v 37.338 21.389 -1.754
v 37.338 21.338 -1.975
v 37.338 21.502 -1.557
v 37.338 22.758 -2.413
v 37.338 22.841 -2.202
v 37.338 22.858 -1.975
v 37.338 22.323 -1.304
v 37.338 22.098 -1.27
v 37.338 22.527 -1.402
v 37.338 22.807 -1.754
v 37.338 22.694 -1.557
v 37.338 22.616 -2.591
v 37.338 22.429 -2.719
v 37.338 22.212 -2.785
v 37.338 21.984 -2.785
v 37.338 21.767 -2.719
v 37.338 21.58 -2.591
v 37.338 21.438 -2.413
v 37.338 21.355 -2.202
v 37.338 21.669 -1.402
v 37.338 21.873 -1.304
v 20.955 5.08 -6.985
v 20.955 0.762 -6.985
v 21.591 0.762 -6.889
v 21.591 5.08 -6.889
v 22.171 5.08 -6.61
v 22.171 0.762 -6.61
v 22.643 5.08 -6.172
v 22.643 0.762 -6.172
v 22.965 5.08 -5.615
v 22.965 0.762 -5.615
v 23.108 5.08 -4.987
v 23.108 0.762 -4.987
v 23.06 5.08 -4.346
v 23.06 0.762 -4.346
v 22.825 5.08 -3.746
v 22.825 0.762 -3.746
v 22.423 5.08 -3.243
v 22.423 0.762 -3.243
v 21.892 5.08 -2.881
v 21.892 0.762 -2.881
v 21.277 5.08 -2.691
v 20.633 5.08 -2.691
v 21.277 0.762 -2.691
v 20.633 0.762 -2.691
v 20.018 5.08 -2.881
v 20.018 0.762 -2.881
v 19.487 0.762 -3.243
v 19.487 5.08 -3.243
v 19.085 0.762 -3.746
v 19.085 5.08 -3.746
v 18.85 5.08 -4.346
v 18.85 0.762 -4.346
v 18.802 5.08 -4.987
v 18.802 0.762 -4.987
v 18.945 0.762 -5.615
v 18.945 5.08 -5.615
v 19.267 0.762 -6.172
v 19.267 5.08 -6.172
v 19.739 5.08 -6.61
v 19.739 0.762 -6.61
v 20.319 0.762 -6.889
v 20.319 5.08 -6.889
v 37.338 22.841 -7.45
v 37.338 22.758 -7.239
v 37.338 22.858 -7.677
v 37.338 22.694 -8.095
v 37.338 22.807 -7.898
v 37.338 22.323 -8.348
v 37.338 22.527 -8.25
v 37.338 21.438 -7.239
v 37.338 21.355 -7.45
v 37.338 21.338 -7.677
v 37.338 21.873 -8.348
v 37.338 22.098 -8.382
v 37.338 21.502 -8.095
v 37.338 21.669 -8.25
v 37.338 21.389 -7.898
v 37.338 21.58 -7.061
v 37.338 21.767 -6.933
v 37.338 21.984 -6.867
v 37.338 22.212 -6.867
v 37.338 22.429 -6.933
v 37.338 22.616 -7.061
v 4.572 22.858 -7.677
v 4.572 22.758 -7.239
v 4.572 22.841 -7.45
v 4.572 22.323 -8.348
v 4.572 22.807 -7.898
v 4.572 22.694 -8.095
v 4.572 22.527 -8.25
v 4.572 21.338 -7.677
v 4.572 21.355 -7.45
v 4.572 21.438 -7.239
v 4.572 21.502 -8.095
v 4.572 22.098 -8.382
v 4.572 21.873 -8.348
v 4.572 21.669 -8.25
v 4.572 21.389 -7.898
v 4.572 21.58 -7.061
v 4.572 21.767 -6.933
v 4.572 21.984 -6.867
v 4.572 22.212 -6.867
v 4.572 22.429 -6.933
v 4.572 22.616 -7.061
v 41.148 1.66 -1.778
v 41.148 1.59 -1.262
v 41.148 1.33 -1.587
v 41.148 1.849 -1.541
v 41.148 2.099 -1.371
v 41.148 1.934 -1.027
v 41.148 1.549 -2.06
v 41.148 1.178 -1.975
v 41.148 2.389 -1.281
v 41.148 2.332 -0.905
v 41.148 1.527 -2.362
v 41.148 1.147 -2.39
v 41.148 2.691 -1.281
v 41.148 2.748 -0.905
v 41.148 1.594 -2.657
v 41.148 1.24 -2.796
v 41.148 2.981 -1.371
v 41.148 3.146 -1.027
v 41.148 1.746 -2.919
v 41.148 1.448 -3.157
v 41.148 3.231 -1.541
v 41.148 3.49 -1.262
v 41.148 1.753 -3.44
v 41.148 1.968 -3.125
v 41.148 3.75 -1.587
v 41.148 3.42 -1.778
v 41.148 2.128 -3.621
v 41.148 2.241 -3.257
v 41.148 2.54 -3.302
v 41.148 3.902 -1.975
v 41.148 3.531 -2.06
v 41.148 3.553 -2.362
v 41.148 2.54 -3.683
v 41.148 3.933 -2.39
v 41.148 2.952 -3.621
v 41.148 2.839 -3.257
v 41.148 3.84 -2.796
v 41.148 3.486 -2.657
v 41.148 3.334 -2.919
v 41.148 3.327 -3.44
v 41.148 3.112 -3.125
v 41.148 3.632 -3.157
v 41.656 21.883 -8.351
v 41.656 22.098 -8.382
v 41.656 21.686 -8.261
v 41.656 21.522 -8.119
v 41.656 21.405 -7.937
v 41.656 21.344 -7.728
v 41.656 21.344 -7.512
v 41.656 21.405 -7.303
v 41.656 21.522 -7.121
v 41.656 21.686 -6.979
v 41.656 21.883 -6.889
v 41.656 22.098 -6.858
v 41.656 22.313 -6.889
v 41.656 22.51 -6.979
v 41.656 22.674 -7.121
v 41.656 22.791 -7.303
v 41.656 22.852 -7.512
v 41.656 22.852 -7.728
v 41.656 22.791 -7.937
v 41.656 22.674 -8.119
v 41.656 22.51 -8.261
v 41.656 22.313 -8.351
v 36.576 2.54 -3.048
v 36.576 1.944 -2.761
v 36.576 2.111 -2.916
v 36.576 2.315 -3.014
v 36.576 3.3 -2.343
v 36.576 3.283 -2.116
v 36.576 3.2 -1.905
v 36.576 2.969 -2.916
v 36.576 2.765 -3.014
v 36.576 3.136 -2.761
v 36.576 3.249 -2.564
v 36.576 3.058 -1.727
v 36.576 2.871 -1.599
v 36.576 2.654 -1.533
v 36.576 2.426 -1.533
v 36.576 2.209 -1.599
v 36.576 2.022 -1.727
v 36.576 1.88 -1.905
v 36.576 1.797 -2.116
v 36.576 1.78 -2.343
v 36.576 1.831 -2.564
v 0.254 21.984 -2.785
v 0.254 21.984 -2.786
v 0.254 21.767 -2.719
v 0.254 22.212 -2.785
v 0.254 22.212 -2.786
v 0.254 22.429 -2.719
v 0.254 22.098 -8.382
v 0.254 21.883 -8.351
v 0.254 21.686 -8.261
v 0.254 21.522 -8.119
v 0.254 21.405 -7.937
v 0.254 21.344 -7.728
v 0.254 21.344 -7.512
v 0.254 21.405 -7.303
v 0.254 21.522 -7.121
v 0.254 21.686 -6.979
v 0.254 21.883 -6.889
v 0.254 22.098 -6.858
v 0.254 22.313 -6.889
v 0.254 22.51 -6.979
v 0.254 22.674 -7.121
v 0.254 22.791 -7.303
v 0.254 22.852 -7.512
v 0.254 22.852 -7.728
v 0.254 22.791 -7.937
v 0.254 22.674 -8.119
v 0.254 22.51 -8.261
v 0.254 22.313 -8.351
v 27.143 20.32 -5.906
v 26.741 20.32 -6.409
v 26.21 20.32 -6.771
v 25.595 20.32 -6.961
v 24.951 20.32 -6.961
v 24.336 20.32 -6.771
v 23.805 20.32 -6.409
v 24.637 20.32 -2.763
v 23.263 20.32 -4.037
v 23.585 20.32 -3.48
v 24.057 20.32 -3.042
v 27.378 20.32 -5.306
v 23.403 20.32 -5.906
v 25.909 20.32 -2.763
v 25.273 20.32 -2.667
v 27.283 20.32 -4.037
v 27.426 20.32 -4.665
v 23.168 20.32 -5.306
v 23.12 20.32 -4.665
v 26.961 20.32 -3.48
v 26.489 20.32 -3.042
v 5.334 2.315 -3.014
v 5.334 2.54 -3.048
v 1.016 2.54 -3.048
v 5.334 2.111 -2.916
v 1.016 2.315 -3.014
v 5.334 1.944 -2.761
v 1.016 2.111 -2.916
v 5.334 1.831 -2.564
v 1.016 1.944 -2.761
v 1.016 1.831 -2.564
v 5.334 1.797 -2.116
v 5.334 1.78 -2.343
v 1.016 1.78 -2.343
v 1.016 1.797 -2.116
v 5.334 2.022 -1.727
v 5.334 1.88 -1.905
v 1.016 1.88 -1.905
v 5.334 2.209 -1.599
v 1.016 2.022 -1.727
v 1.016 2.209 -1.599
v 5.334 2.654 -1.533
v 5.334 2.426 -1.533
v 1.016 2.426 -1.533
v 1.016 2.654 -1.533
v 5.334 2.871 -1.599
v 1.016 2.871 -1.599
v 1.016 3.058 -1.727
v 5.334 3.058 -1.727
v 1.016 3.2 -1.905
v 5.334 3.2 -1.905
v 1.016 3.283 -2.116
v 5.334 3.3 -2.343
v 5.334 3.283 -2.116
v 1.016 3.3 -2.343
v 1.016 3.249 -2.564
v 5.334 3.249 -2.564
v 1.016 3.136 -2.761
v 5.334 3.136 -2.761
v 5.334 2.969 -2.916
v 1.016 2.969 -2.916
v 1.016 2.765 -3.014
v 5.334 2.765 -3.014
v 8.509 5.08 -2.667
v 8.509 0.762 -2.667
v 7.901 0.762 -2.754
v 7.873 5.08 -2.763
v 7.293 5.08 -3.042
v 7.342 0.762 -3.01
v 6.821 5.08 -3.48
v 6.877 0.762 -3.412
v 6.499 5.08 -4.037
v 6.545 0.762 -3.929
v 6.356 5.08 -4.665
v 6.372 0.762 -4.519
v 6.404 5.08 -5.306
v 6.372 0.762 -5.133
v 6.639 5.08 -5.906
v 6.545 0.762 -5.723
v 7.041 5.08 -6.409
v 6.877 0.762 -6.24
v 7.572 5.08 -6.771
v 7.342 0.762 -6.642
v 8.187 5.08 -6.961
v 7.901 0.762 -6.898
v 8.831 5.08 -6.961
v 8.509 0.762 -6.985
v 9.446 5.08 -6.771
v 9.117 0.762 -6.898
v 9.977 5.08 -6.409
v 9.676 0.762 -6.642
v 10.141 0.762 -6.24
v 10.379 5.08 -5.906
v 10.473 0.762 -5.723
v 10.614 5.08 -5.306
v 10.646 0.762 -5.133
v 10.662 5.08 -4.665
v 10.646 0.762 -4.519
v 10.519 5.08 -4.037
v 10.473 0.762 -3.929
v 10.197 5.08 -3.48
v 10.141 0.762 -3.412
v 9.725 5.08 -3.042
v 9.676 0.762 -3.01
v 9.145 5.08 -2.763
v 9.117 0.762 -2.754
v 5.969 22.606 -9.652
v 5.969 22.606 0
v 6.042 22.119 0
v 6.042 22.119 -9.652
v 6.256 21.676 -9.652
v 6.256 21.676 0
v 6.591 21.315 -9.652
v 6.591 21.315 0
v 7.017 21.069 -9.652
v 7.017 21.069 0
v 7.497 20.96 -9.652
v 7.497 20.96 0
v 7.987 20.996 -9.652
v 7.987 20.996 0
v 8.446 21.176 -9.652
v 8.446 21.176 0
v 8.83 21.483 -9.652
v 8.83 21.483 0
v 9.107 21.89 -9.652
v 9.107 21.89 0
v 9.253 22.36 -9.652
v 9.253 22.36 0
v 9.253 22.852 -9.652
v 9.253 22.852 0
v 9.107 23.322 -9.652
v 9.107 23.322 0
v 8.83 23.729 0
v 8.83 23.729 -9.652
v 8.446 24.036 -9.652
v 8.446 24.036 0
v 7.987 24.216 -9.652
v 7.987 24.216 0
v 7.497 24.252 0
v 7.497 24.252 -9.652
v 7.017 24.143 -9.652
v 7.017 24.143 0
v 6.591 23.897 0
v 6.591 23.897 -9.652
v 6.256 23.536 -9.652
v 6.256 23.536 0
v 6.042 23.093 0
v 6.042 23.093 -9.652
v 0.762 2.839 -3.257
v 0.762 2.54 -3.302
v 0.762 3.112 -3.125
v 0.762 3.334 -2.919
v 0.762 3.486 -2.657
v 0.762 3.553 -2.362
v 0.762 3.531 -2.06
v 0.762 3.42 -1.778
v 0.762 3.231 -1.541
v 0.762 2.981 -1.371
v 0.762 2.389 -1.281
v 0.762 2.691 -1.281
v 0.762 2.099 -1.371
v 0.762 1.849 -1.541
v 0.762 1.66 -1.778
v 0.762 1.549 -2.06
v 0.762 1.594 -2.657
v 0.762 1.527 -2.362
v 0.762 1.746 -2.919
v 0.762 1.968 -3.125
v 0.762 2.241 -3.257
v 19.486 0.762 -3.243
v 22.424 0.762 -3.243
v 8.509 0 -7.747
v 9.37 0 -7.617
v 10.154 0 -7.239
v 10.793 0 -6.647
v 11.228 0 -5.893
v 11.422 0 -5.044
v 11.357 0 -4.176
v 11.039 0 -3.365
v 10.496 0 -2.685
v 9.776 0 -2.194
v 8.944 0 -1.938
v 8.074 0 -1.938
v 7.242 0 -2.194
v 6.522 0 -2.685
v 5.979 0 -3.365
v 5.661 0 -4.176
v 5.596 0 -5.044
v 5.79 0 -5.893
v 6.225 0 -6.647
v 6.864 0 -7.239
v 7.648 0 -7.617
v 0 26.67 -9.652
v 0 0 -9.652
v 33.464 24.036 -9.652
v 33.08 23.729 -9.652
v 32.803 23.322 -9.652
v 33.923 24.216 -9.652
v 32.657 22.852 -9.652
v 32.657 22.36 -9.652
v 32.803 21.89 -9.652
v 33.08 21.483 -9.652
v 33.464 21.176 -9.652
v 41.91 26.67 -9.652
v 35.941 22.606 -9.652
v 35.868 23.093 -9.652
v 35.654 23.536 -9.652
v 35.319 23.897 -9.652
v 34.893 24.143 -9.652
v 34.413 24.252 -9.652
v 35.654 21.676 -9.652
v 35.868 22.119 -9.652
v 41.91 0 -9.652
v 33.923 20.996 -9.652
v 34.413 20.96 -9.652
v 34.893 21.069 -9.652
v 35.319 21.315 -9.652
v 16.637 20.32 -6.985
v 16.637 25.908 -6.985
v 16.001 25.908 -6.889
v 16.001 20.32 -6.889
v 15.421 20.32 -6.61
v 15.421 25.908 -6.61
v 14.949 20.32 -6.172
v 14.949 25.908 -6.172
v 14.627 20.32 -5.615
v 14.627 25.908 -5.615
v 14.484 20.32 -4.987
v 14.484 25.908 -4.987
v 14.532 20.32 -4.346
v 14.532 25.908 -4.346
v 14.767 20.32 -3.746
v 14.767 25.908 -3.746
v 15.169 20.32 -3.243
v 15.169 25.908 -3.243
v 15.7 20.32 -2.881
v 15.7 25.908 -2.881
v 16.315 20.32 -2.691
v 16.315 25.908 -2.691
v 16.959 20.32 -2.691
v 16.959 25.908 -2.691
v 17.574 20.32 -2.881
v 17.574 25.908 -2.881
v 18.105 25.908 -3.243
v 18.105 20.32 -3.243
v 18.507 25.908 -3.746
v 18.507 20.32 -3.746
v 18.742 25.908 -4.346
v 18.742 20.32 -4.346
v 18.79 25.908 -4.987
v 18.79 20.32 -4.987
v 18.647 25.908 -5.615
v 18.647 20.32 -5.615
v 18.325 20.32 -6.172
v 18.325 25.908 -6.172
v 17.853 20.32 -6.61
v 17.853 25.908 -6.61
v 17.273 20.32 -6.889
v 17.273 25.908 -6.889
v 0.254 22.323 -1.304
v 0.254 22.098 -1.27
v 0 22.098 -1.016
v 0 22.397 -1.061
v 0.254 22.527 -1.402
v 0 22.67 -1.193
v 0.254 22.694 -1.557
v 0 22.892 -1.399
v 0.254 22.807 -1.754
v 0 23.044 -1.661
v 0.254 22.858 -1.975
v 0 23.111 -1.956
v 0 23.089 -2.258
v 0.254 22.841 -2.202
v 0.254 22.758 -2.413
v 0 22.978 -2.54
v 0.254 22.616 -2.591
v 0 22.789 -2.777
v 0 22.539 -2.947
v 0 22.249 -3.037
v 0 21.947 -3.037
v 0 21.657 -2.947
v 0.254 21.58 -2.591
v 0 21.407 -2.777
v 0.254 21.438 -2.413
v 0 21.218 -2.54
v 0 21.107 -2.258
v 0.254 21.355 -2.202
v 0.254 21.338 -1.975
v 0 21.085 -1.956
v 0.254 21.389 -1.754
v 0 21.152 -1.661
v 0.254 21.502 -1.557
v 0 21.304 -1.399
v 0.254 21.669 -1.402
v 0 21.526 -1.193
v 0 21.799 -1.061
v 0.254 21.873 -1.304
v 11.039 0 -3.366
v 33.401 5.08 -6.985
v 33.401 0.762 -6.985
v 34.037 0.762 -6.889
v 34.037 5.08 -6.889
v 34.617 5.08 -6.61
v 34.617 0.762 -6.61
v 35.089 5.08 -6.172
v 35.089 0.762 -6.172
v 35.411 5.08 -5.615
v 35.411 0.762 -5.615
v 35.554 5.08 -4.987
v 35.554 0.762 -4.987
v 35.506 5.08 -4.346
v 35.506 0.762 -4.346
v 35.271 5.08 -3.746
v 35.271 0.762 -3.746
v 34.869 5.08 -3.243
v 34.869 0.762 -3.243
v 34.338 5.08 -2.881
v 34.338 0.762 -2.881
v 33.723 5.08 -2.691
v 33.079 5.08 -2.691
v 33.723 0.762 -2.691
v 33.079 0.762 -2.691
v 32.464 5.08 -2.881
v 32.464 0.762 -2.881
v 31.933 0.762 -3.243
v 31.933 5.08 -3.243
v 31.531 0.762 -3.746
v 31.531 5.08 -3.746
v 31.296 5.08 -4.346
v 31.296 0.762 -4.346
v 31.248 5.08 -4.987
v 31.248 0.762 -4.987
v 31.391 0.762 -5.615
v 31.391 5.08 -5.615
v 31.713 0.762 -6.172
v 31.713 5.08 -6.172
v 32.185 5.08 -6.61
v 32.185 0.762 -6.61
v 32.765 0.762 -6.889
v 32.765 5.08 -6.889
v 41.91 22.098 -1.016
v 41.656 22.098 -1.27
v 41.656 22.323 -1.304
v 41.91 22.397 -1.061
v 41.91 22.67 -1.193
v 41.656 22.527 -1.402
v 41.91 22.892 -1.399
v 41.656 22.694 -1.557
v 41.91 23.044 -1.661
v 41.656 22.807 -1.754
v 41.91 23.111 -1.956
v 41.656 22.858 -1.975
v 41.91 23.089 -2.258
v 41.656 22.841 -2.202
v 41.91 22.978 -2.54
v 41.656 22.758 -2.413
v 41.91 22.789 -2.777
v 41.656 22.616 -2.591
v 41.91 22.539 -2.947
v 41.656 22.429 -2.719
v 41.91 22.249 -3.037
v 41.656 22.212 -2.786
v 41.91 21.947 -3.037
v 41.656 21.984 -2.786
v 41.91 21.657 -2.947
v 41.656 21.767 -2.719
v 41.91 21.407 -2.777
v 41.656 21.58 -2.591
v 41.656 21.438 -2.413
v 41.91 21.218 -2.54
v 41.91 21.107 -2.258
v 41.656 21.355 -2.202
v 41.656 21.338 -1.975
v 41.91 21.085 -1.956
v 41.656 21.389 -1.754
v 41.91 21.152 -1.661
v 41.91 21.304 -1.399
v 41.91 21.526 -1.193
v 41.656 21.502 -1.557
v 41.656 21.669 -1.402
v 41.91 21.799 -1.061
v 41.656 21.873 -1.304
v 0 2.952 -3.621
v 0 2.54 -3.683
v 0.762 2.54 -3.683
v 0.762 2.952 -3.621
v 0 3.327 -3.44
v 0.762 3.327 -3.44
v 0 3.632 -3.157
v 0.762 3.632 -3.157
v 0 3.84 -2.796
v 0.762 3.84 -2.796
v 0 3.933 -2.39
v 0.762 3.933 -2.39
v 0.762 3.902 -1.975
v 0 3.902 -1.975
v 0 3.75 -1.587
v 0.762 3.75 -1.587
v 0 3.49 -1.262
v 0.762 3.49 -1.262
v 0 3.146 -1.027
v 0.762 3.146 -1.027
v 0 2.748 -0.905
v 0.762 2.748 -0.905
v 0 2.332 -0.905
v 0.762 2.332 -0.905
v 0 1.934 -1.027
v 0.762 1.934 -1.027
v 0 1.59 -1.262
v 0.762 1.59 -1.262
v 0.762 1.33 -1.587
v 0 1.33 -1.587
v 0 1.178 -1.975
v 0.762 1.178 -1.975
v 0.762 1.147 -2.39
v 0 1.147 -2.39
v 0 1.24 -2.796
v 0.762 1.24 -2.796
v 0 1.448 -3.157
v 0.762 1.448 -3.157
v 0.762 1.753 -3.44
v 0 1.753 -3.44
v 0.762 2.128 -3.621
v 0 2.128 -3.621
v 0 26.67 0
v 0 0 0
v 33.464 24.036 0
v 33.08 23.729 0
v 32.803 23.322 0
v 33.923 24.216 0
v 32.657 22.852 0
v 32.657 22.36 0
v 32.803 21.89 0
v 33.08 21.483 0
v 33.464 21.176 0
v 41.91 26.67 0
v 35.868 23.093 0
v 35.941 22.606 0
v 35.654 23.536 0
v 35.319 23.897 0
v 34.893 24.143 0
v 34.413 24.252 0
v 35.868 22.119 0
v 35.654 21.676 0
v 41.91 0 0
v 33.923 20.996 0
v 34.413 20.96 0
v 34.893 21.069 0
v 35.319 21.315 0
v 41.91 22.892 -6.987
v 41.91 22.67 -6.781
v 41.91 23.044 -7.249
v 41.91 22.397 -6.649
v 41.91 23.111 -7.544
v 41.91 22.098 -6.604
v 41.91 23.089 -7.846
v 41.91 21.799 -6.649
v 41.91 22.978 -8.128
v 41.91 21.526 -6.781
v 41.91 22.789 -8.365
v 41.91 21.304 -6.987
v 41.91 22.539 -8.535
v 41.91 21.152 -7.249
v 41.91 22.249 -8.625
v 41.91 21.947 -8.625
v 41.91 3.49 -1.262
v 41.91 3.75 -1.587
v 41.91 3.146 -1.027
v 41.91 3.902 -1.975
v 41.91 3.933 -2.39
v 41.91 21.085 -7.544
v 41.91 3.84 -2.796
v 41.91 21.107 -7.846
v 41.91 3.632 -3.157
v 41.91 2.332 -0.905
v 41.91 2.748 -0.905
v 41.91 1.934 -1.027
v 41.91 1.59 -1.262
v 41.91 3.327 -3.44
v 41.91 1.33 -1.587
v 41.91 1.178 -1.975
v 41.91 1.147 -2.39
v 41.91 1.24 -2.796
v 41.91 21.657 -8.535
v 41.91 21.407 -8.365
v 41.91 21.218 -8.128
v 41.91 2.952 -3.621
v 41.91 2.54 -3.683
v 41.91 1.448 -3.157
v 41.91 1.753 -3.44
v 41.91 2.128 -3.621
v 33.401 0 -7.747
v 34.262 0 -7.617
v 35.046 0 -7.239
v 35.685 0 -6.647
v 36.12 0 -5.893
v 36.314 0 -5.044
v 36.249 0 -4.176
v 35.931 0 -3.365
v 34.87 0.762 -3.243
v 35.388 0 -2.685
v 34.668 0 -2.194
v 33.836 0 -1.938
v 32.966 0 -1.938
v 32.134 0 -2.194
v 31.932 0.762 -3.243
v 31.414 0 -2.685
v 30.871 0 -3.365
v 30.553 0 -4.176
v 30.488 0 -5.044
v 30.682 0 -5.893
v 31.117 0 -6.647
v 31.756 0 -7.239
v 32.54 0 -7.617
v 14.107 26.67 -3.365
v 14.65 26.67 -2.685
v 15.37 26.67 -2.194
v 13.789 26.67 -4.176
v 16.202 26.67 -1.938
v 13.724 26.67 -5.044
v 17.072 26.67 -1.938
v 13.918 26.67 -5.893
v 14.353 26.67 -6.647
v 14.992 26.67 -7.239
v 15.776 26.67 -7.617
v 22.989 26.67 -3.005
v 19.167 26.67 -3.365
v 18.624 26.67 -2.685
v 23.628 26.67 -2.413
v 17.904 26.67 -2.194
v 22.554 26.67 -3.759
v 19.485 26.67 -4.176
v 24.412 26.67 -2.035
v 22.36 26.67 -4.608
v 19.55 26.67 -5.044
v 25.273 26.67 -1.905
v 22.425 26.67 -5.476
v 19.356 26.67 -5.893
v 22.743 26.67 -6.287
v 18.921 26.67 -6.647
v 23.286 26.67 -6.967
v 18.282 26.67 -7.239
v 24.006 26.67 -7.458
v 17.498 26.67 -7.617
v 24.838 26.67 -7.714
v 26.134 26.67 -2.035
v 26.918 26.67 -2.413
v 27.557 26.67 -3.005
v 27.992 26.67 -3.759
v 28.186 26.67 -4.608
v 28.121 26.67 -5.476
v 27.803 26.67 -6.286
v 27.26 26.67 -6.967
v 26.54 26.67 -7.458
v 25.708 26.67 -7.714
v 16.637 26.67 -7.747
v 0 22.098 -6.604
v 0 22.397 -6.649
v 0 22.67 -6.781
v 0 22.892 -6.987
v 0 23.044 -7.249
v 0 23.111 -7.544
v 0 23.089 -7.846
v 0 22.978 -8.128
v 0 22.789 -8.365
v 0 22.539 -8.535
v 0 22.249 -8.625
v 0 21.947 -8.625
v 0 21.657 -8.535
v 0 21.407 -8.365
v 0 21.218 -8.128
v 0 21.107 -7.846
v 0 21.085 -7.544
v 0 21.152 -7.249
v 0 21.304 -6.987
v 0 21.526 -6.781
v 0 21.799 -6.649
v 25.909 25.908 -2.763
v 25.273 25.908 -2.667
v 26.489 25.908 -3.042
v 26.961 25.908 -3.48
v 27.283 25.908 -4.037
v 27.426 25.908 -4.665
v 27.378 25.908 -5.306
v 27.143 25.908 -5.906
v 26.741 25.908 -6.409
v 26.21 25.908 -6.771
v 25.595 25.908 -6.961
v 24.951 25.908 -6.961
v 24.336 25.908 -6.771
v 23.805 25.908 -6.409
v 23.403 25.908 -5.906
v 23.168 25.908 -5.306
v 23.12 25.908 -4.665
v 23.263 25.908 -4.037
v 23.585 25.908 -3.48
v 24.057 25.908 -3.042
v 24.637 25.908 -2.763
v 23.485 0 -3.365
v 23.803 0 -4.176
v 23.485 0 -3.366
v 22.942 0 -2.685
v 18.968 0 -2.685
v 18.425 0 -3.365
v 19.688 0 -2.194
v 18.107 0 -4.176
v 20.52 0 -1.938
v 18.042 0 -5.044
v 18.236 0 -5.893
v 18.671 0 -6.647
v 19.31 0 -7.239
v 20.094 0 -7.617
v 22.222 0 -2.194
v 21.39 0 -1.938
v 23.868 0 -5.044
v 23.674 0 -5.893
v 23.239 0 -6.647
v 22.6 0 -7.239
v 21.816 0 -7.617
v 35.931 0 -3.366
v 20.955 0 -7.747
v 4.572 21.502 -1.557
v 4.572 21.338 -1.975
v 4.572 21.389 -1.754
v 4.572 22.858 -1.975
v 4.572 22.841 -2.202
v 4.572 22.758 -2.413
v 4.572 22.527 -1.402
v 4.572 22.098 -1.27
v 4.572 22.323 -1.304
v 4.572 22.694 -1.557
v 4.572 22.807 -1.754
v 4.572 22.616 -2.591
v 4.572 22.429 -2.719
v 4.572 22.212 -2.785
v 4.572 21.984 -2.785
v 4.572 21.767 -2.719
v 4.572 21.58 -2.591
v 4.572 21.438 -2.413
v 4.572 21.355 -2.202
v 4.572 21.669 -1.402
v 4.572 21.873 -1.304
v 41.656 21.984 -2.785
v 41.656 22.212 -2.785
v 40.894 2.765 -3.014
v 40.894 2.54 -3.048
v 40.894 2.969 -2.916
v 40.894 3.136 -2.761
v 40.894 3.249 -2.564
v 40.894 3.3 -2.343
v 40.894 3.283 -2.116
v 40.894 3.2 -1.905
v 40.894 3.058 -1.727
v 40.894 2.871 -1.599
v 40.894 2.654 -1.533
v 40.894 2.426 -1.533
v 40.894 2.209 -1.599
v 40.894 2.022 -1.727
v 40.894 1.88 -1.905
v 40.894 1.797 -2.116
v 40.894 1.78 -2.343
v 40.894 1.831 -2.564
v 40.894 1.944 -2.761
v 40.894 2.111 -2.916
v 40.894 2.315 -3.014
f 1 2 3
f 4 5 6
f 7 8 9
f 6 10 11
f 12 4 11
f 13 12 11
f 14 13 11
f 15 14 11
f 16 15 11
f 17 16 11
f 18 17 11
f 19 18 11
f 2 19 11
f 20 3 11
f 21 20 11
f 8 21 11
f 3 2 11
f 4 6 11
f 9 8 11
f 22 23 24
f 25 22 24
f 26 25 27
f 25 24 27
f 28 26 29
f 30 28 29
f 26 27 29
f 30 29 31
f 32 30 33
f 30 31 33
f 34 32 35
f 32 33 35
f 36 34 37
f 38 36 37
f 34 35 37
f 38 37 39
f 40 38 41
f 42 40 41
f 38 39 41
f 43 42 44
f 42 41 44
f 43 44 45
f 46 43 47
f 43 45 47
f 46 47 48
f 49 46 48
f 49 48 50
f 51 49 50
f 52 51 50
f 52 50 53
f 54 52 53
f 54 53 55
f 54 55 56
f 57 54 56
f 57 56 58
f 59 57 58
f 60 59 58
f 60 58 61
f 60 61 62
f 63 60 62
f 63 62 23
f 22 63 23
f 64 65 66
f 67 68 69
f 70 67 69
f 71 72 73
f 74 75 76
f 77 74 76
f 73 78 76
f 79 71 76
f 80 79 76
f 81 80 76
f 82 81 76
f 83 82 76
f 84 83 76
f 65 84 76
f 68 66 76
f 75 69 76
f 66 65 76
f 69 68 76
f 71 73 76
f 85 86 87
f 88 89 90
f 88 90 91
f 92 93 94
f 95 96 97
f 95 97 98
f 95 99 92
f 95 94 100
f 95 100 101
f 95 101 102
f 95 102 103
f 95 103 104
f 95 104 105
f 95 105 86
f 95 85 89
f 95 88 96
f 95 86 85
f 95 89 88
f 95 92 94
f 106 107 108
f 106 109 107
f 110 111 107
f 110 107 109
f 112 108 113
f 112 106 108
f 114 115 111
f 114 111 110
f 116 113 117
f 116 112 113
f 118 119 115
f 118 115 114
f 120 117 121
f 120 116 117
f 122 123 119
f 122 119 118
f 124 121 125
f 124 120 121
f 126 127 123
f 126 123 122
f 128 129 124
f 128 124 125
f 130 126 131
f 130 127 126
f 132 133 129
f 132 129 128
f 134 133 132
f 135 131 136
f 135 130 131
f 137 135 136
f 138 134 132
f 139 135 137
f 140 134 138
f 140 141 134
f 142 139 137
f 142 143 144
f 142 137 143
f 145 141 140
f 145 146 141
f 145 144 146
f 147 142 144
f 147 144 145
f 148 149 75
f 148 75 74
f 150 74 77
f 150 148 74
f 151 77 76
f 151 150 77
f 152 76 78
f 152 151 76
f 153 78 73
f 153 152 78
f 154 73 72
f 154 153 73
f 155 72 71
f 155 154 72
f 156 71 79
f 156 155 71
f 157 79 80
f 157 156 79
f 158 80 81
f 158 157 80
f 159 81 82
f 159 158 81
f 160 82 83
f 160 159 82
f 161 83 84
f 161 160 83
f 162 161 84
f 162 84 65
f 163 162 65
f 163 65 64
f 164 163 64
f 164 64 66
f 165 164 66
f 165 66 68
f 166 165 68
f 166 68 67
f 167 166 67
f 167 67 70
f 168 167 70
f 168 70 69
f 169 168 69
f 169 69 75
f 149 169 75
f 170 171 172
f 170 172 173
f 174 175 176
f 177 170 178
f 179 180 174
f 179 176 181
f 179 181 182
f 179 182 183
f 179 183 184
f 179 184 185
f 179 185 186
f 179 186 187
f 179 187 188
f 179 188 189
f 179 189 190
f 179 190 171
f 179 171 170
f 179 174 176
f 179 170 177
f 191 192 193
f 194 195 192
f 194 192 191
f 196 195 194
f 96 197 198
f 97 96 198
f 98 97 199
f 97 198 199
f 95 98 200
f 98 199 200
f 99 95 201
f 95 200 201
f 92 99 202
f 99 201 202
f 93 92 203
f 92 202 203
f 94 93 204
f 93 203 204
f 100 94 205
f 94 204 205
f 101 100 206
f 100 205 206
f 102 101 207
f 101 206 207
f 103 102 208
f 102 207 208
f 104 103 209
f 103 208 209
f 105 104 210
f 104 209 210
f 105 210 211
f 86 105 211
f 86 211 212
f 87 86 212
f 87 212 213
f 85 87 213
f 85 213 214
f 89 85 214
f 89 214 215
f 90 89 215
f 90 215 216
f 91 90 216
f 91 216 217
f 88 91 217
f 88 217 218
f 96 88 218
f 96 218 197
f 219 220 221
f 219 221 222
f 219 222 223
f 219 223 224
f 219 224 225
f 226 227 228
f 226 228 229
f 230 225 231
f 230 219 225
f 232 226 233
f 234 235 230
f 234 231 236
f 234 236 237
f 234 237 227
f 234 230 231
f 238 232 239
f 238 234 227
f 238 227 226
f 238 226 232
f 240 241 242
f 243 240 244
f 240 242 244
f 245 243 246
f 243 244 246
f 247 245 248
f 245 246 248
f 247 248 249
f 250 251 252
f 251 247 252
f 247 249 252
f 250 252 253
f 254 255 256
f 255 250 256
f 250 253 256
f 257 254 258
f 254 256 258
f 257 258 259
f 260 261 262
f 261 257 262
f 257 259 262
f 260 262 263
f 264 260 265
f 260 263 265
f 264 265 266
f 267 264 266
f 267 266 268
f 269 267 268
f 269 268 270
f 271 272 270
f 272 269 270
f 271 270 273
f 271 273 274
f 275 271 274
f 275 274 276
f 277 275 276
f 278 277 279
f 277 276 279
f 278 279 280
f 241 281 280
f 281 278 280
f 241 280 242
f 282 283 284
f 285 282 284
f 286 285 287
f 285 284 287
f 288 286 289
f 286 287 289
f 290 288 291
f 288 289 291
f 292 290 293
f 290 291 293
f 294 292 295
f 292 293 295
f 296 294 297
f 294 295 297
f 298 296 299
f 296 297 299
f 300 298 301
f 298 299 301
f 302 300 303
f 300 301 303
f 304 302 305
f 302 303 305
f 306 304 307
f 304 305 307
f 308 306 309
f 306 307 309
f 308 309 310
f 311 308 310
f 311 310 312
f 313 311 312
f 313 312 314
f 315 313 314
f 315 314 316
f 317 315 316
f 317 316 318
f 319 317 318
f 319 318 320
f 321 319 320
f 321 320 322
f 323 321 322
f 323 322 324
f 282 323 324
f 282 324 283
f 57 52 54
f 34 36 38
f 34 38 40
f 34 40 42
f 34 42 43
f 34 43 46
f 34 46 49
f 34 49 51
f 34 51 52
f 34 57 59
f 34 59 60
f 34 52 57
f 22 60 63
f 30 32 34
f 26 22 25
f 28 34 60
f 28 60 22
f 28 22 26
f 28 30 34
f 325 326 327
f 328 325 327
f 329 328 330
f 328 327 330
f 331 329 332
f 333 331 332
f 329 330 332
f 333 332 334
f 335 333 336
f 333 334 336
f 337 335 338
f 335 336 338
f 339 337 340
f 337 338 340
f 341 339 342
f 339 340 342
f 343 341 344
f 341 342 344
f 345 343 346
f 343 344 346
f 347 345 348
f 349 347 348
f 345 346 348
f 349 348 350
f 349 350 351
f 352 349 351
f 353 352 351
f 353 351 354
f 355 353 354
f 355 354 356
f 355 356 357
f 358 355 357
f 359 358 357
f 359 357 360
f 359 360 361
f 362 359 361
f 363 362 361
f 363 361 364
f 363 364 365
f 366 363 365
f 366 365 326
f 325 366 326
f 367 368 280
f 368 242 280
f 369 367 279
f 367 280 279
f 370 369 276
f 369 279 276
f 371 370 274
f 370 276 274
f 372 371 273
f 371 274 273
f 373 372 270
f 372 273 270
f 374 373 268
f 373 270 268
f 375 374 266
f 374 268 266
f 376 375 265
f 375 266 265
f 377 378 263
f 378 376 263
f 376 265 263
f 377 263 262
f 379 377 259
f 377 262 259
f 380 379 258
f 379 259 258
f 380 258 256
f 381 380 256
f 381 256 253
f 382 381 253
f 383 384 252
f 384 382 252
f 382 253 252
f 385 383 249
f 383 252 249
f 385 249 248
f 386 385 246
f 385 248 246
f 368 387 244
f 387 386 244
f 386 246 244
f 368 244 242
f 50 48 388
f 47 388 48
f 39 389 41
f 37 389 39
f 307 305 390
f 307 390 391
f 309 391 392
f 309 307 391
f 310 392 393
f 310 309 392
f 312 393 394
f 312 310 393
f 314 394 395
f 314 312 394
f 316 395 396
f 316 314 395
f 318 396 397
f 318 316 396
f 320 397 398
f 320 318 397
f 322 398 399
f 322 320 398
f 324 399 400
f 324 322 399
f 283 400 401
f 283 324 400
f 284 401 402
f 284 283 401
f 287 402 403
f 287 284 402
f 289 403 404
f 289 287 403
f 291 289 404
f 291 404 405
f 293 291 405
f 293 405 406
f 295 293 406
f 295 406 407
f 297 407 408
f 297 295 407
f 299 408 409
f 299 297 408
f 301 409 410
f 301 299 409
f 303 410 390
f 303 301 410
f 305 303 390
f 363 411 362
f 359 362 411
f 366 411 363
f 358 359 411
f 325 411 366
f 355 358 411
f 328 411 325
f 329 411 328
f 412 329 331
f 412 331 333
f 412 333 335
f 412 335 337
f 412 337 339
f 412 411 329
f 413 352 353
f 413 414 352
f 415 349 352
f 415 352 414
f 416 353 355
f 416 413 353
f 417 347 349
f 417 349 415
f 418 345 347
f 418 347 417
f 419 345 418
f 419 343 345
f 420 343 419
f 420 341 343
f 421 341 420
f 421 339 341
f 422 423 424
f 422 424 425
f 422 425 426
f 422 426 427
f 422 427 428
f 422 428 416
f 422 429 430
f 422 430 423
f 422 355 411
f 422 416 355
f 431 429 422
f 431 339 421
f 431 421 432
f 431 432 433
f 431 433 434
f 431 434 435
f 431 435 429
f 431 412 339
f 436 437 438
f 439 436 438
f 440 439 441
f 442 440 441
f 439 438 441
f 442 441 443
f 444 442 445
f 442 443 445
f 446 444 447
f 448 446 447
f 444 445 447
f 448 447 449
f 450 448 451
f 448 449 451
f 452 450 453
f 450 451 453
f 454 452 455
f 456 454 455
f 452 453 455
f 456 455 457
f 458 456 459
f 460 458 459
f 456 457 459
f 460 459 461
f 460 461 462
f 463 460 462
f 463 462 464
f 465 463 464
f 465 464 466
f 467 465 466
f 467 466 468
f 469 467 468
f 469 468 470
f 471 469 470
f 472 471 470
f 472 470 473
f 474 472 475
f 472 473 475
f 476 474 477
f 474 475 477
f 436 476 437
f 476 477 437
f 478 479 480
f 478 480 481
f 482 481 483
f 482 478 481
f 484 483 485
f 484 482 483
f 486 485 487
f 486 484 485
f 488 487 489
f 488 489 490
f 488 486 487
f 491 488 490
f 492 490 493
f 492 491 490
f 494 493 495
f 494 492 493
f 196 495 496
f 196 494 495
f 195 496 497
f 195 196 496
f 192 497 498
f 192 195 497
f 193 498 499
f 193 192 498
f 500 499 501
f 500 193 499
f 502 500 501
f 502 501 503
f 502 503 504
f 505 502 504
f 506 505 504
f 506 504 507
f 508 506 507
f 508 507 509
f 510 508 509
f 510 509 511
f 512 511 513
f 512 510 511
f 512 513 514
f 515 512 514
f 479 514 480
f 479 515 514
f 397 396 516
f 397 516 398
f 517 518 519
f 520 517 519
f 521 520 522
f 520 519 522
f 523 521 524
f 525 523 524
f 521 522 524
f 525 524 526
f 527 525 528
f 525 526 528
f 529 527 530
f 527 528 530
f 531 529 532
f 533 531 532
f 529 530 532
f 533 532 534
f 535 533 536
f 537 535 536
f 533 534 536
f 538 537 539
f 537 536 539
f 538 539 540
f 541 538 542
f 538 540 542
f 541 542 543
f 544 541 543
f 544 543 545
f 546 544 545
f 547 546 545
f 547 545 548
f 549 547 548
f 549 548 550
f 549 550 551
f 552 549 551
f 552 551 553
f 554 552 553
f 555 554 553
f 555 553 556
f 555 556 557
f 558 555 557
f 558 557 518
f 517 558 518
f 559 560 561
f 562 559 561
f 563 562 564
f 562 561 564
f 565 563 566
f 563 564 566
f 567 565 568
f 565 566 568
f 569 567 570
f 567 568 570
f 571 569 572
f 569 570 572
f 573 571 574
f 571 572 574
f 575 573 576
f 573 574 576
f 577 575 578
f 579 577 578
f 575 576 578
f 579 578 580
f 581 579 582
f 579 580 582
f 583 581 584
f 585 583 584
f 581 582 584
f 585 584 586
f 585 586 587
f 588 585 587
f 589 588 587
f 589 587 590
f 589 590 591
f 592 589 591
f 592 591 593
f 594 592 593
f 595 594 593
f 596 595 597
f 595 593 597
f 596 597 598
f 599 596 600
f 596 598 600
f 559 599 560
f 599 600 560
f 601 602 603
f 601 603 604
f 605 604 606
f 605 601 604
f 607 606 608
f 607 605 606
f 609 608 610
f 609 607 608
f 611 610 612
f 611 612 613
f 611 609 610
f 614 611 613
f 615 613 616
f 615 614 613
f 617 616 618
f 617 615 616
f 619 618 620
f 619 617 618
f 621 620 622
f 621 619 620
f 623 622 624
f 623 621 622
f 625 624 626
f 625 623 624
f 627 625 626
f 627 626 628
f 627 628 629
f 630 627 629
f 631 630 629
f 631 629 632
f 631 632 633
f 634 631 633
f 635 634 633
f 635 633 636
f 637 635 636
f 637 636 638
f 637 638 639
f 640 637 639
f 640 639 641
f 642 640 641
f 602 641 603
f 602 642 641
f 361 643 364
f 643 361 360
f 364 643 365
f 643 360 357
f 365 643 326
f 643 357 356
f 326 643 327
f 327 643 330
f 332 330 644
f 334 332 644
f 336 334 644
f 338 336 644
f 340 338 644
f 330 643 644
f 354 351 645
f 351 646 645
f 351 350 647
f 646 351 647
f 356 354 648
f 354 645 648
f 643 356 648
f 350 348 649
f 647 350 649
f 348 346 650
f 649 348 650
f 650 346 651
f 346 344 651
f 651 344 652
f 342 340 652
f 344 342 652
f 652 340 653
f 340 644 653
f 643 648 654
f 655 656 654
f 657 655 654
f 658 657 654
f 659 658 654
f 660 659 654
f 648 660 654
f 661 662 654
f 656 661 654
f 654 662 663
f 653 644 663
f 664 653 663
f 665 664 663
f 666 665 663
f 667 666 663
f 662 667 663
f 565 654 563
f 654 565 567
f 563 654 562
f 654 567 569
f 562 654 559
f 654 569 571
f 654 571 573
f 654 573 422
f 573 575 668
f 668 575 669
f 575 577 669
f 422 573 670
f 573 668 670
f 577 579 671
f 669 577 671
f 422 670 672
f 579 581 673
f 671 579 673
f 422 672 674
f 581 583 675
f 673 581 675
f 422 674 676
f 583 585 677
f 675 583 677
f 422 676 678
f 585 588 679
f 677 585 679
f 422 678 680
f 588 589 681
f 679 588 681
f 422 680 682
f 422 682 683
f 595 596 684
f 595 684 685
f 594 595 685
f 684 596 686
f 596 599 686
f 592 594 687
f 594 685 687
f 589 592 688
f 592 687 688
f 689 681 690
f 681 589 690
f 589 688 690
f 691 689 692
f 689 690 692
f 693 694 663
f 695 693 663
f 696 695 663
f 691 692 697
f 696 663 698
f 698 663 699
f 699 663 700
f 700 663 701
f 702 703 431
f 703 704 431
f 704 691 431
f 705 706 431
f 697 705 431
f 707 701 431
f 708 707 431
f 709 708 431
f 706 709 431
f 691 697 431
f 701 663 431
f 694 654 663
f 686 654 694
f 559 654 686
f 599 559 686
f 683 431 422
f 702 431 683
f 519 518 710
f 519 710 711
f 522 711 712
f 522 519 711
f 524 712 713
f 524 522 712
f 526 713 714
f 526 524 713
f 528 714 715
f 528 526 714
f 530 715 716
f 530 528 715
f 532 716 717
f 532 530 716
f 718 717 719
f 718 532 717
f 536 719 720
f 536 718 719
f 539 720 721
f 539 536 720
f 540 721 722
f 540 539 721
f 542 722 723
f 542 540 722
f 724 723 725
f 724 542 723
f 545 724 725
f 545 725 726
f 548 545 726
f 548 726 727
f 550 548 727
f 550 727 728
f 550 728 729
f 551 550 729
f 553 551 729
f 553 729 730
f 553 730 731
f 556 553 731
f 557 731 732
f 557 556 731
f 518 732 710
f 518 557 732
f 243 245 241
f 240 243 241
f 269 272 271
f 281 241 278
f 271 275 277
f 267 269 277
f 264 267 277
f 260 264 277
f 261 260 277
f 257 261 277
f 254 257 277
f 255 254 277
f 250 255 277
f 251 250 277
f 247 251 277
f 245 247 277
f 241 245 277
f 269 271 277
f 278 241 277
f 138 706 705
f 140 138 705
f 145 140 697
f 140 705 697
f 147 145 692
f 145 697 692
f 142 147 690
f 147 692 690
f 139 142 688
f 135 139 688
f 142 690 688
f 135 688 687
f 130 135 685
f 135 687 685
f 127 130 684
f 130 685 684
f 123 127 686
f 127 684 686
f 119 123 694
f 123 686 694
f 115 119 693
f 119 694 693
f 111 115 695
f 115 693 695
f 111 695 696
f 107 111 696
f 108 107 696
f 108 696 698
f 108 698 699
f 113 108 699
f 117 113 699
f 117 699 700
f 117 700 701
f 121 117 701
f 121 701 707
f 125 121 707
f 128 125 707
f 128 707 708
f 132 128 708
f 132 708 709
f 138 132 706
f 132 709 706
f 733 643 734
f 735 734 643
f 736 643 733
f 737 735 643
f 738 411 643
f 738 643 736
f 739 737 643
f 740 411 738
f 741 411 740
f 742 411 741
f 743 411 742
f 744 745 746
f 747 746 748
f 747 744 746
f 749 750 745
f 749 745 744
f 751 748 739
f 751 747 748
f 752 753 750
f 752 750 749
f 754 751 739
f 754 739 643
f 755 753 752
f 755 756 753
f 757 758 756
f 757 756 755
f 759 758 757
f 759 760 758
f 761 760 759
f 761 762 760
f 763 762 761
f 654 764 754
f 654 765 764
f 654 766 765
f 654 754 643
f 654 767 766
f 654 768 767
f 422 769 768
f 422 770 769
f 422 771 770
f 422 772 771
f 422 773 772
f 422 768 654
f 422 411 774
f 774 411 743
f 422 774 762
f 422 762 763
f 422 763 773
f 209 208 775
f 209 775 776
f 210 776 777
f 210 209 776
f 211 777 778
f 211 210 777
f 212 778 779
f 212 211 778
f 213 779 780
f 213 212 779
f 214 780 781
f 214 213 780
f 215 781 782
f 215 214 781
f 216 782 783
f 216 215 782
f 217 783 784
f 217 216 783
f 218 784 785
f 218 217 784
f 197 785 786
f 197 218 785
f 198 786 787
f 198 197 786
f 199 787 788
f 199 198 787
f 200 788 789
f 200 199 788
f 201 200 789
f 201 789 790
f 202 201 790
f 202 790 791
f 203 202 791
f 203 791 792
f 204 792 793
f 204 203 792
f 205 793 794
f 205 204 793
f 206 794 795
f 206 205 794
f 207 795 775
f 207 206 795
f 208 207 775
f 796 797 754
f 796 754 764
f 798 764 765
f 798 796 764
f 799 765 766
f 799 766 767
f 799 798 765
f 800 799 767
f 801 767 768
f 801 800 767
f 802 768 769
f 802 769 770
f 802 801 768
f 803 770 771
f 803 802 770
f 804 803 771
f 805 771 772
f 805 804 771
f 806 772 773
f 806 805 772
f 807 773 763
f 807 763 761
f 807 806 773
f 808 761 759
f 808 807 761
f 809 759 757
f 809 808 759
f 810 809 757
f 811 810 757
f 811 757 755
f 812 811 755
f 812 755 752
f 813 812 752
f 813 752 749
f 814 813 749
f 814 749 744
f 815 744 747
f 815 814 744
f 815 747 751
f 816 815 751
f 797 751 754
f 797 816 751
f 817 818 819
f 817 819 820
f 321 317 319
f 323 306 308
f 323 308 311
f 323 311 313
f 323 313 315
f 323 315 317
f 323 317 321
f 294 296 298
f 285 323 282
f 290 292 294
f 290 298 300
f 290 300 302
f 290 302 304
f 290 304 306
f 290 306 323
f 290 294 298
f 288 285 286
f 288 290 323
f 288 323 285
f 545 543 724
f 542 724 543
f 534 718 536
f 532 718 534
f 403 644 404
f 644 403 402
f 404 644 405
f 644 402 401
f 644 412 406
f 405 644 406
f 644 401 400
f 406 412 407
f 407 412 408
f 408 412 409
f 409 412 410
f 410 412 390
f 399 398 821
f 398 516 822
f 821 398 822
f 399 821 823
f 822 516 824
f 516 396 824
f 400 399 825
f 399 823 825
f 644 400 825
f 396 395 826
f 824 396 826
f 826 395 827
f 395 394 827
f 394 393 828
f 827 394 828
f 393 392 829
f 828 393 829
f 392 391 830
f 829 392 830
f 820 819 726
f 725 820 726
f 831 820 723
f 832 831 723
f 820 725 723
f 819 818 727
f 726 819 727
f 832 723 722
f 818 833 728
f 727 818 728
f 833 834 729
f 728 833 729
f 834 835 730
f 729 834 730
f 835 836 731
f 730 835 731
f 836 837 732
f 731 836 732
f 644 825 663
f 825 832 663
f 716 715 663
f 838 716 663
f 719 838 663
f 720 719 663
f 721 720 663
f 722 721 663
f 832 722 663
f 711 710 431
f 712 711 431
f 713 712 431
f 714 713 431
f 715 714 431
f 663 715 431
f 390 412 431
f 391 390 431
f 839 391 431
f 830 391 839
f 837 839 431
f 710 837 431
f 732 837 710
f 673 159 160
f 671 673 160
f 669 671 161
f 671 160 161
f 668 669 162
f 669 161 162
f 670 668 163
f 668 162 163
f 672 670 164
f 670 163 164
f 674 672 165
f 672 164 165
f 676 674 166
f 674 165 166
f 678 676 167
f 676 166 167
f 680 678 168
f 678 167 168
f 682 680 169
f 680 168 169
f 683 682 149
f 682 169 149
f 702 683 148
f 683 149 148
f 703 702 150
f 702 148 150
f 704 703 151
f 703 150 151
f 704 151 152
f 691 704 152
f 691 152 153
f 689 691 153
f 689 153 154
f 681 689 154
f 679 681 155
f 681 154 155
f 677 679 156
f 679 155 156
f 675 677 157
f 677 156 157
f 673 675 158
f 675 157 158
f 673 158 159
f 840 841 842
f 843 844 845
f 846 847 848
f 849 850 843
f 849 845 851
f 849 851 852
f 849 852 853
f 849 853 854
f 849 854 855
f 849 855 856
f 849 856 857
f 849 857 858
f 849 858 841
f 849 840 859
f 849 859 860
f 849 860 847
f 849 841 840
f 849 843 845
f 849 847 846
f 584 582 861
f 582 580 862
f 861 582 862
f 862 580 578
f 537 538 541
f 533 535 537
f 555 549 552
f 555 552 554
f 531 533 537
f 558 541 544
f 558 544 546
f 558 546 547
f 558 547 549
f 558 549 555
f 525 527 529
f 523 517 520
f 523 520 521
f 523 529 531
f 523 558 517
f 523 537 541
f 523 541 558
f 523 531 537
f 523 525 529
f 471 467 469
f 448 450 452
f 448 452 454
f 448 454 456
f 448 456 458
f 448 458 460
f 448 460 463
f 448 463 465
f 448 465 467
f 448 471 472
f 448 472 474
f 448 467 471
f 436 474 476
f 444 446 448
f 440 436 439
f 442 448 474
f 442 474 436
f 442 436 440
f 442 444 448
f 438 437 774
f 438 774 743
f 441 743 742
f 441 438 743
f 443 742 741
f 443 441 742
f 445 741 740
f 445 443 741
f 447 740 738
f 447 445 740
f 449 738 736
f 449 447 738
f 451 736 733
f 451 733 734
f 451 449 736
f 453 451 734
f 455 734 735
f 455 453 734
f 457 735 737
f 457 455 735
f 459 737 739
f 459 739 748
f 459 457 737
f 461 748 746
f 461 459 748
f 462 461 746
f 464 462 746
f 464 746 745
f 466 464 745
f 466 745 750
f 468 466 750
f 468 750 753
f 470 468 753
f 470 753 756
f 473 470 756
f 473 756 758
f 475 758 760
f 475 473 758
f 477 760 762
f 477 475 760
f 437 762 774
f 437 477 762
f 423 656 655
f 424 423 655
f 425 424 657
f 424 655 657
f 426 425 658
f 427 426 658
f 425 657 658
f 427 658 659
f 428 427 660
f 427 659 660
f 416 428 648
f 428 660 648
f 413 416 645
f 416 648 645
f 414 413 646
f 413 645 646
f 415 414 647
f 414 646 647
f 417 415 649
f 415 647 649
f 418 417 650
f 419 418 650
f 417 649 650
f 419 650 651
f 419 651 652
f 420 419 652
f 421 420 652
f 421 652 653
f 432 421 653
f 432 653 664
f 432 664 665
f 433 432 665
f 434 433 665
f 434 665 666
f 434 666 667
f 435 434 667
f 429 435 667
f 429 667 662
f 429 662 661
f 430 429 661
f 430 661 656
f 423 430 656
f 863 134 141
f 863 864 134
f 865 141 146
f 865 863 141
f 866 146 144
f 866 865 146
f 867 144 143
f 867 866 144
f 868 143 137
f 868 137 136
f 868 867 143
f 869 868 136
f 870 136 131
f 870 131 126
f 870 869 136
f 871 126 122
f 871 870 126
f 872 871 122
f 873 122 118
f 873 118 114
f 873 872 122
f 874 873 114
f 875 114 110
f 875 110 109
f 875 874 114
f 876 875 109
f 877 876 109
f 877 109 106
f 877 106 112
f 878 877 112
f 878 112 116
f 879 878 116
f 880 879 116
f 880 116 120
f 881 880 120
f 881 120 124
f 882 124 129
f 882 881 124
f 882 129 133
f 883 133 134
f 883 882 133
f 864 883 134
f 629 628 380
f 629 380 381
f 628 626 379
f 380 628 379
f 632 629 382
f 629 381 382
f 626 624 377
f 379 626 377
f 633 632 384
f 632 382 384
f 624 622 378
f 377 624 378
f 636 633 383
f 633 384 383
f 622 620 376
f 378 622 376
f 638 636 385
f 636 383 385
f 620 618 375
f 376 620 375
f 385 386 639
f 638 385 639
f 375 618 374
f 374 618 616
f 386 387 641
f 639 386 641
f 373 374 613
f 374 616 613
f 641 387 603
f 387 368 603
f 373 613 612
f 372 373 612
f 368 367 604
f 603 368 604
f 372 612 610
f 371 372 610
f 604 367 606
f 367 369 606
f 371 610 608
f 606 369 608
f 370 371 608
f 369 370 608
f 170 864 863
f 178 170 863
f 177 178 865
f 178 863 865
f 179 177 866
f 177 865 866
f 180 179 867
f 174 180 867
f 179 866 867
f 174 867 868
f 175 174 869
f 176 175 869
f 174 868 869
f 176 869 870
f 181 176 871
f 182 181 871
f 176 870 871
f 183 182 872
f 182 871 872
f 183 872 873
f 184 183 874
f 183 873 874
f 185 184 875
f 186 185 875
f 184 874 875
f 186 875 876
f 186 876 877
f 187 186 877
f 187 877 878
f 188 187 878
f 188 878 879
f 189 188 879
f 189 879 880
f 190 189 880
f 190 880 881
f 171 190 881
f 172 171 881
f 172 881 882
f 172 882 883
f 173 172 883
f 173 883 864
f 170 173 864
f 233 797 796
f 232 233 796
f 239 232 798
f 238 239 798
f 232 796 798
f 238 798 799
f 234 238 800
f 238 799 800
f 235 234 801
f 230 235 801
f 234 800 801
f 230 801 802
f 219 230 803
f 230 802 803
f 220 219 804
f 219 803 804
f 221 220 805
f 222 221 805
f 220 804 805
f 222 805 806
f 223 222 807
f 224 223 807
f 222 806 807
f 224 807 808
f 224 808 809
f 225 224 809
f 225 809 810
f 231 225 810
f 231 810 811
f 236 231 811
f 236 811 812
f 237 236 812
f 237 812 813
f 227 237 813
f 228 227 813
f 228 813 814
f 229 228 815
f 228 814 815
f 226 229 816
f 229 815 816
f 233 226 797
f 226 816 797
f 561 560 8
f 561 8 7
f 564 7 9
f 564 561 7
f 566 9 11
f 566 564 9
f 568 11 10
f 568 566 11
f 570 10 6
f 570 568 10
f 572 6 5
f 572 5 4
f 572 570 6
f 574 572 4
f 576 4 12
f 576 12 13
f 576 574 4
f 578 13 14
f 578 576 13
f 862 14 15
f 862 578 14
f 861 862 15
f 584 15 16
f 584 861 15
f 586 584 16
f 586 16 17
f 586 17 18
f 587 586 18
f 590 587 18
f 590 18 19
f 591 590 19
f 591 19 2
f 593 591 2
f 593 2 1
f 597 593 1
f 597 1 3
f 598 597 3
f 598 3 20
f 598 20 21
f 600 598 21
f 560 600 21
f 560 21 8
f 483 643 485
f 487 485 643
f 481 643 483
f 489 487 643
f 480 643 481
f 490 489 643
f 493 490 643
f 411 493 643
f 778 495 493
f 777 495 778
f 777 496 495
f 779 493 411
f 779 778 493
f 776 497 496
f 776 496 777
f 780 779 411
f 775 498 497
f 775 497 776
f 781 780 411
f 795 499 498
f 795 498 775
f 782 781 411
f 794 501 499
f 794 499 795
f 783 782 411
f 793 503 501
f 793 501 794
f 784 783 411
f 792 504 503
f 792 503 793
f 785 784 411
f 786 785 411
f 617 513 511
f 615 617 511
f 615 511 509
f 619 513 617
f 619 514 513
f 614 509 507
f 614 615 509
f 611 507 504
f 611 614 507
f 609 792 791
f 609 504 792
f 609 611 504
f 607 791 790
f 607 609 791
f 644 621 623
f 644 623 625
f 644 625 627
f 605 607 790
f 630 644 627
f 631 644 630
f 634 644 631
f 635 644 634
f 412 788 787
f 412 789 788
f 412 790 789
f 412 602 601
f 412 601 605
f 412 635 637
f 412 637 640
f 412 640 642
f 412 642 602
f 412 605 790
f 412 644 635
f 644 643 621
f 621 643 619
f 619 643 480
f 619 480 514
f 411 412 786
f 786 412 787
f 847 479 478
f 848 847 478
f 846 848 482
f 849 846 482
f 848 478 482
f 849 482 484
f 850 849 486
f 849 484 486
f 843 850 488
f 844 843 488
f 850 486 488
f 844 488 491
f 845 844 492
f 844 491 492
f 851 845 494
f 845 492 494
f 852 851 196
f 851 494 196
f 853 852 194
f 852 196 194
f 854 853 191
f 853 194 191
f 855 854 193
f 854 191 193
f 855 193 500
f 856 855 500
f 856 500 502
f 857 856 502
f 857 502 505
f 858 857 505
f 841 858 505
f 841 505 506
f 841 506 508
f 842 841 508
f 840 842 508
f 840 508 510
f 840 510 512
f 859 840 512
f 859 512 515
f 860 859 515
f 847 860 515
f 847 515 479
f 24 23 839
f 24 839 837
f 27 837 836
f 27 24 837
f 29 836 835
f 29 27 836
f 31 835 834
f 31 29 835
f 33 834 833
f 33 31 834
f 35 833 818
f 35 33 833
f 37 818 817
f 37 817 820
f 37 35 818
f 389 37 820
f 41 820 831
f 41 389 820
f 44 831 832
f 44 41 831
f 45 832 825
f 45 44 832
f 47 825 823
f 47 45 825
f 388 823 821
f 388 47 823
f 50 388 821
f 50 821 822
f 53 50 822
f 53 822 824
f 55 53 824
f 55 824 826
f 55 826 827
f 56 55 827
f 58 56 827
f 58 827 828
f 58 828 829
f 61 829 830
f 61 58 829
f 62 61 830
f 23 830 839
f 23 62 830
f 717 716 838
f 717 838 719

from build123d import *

# Parameters (mm, degrees)
SKETCH1_W                = 41.91
SKETCH1_H                = 9.652
BOSS_EXTRUDE1_DEPTH      = 26.67
SKETCH2_R                = 1.651
CUT_EXTRUDE1_DEPTH       = 51.605316954
SKETCH3_R                = 2.159
CUT_EXTRUDE2_DEPTH       = 6.35
CHAMFER5_SIZE            = 0.762
SKETCH5_R                = 2.159
CUT_EXTRUDE4_DEPTH       = 5.08
SKETCH6_R                = 2.921
CUT_EXTRUDE5_DEPTH       = 0.762
CHAMFER2_SIZE            = 0.762
SKETCH7_R                = 0.762
CUT_EXTRUDE6_DEPTH       = 5.334
SKETCH9_R                = 1.016
CUT_EXTRUDE7_DEPTH       = 1.27
SKETCH10_R               = 1.397
CUT_EXTRUDE8_DEPTH       = 0.762
CHAMFER3_SIZE            = 0.508
CHAMFER3_OF_MIRROR2_SIZE = 0.508
SKETCH12_R               = 0.762
CUT_EXTRUDE9_DEPTH       = 4.572
SKETCH14_R               = 1.016
CUT_EXTRUDE10_DEPTH      = 0.254
CHAMFER4_SIZE            = 0.254
CHAMFER4_OF_MIRROR3_SIZE = 0.254


# Some blends are built 0.0001 mm under size
with BuildPart() as part:
    # Sketch1 → Boss-Extrude1 (new body)
    with BuildSketch(Plane(origin=(0, 0, 0), x_dir=(1, 0, 0), z_dir=(0, 1, 0))):
        with Locations((20.955, 4.826)):
            Rectangle(SKETCH1_W, SKETCH1_H)
    extrude(amount=BOSS_EXTRUDE1_DEPTH)

    # Sketch2 → Cut-Extrude1 (cut, through all)
    with BuildSketch(Plane.XY):
        with Locations((34.29, 22.606)):
            Circle(SKETCH2_R)
        with Locations(Location((7.62, 22.606, 0), (0, 0, 180))):
            Circle(SKETCH2_R)
    extrude(amount=-CUT_EXTRUDE1_DEPTH, mode=Mode.SUBTRACT)

    # Sketch3 → Cut-Extrude2 (cut)
    with BuildSketch(Plane(origin=(0, 26.67, 0), x_dir=(1, 0, 0), z_dir=(0, 1, 0))):
        with Locations(Location((25.273, 4.826, 0), (0, 0, 270))):
            Circle(SKETCH3_R)
        with Locations(Location((16.637, 4.826, 0), (0, 0, 90))):
            Circle(SKETCH3_R)
    extrude(amount=-CUT_EXTRUDE2_DEPTH, mode=Mode.SUBTRACT)

    # Chamfer5
    chamfer5_edges = [part.edges().sort_by_distance(p)[0] for p in [
        (25.273, 26.67, -6.985),
        (16.637, 26.67, -2.667),
    ]]
    chamfer(chamfer5_edges, length=CHAMFER5_SIZE)

    # Sketch5 → Cut-Extrude4 (cut)
    with BuildSketch(Plane(origin=(0, 0, 0), x_dir=(-1, 0, 0), z_dir=(0, -1, 0))):
        with Locations(Location((-33.401, 4.826, 0), (0, 0, 90))):
            Circle(SKETCH5_R)
        with Locations(Location((-8.509, 4.826, 0), (0, 0, 270))):
            Circle(SKETCH5_R)
        with Locations(Location((-20.955, 4.826, 0), (0, 0, 90))):
            Circle(SKETCH5_R)
    extrude(amount=-CUT_EXTRUDE4_DEPTH, mode=Mode.SUBTRACT)

    # Sketch6 → Cut-Extrude5 (cut)
    with BuildSketch(Plane(origin=(0, 0, 0), x_dir=(-1, 0, 0), z_dir=(0, -1, 0))):
        with Locations(Location((-33.401, 4.826, 0), (0, 0, 90))):
            Circle(SKETCH6_R)
        with Locations(Location((-20.955, 4.826, 0), (0, 0, 90))):
            Circle(SKETCH6_R)
        with Locations(Location((-8.509, 4.826, 0), (0, 0, 90))):
            Circle(SKETCH6_R)
    extrude(amount=-CUT_EXTRUDE5_DEPTH, mode=Mode.SUBTRACT)

    # Chamfer2
    chamfer2_edges = [part.edges().sort_by_distance(p)[0] for p in [
        (33.401, 0.762, -1.905),
        (20.955, 0.762, -1.905),
        (8.509, 0.762, -1.905),
    ]]
    chamfer(chamfer2_edges, length=CHAMFER2_SIZE - 0.0001)  # a hair under: the kernel refuses the full size

    # Sketch7 → Cut-Extrude6 (cut)
    with BuildSketch(Plane(origin=(41.91, 0, 0), x_dir=(0, 0, -1), z_dir=(1, 0, 0))):
        with Locations((2.286, 2.54)):
            Circle(SKETCH7_R)
    cut_extrude6 = extrude(amount=-CUT_EXTRUDE6_DEPTH, mode=Mode.SUBTRACT)

    # Sketch9 → Cut-Extrude7 (cut)
    with BuildSketch(Plane(origin=(41.91, 0, 0), x_dir=(0, 0, -1), z_dir=(1, 0, 0))):
        with Locations((2.286, 2.54)):
            Circle(SKETCH9_R)
    cut_extrude7 = extrude(amount=-CUT_EXTRUDE7_DEPTH, mode=Mode.SUBTRACT)

    # Sketch10 → Cut-Extrude8 (cut)
    with BuildSketch(Plane(origin=(41.91, 0, 0), x_dir=(0, 0, -1), z_dir=(1, 0, 0))):
        with Locations((2.286, 2.54)):
            Circle(SKETCH10_R)
    cut_extrude8 = extrude(amount=-CUT_EXTRUDE8_DEPTH, mode=Mode.SUBTRACT)

    # Chamfer3
    # the kernel refuses this chamfer: 0.508 mm, written as the material it adds along each edge
    with BuildSketch(Plane(origin=(40.64, 2.54, -2.286), x_dir=(0, 0, -1), z_dir=(0, -1, 0))) as chamfer3_piece_1_section:
        Polygon((1.016, CHAMFER3_SIZE), (1.016 - CHAMFER3_SIZE, 0), (1.016, 0), align=None)
    chamfer3_piece_1 = revolve(axis=Axis((40.64, 2.54, -2.286), (1, 0, 0)), mode=Mode.PRIVATE)
    chamfer3_piece_1 = split(chamfer3_piece_1, bisect_by=Plane(origin=(41.148, 2.54, -1.391029136), z_dir=(-1, 0, 0)), keep=Keep.TOP, mode=Mode.PRIVATE)
    chamfer3_piece_1 = chamfer3_piece_1 - Plane(origin=(41.015029136, 2.54, -2.286), x_dir=(0, 0, -1), z_dir=(1, 0, 0)) * Cylinder(0.762, 5, mode=Mode.PRIVATE)
    add(chamfer3_piece_1)

    # Mirror2: Cut-Extrude6, Cut-Extrude7, Cut-Extrude8 across plane
    add(cut_extrude6.mirror(Plane.ZY.offset(-20.955)), mode=Mode.SUBTRACT)
    add(cut_extrude7.mirror(Plane.ZY.offset(-20.955)), mode=Mode.SUBTRACT)
    add(cut_extrude8.mirror(Plane.ZY.offset(-20.955)), mode=Mode.SUBTRACT)

    # Chamfer3 of Mirror2
    # the kernel refuses this chamfer: 0.508 mm, written as the material it adds along each edge
    with BuildSketch(Plane(origin=(1.27, 2.54, -2.286), x_dir=(0, 0, -1), z_dir=(0, -1, 0))) as chamfer3_of_mirror2_piece_1_section:
        Polygon((1.016, -CHAMFER3_OF_MIRROR2_SIZE), (1.016 - CHAMFER3_OF_MIRROR2_SIZE, 0), (1.016, 0), align=None)
    chamfer3_of_mirror2_piece_1 = revolve(axis=Axis((1.27, 2.54, -2.286), (1, 0, 0)), mode=Mode.PRIVATE)
    chamfer3_of_mirror2_piece_1 = split(chamfer3_of_mirror2_piece_1, bisect_by=Plane(origin=(0.762, 2.54, -1.391029136), z_dir=(1, 0, 0)), keep=Keep.TOP, mode=Mode.PRIVATE)
    chamfer3_of_mirror2_piece_1 = chamfer3_of_mirror2_piece_1 - Plane(origin=(0.894970864, 2.54, -2.286), x_dir=(0, 0, -1), z_dir=(-1, 0, 0)) * Cylinder(0.762, 5, mode=Mode.PRIVATE)
    add(chamfer3_of_mirror2_piece_1)

    # Sketch12 → Cut-Extrude9 (cut)
    with BuildSketch(Plane.ZY):
        with Locations((-2.032, 22.098)):
            Circle(SKETCH12_R)
        with Locations(Location((-7.62, 22.098, 0), (0, 0, 180))):
            Circle(SKETCH12_R)
    cut_extrude9 = extrude(amount=-CUT_EXTRUDE9_DEPTH, mode=Mode.SUBTRACT)

    # Sketch14 → Cut-Extrude10 (cut)
    with BuildSketch(Plane.ZY):
        with Locations((-7.62, 22.098)):
            Circle(SKETCH14_R)
        with Locations((-2.032, 22.098)):
            Circle(SKETCH14_R)
    cut_extrude10 = extrude(amount=-CUT_EXTRUDE10_DEPTH, mode=Mode.SUBTRACT)

    # Chamfer4
    chamfer4_edges = [part.edges().sort_by_distance(p)[0] for p in [
        (0.254, 22.098, -8.636),
        (0.254, 22.098, -3.048),
    ]]
    chamfer(chamfer4_edges, length=CHAMFER4_SIZE - 0.0001)  # a hair under: the kernel refuses the full size

    # Mirror3: Cut-Extrude9, Cut-Extrude10 across plane
    add(cut_extrude9.mirror(Plane.ZY.offset(-20.955)), mode=Mode.SUBTRACT)
    add(cut_extrude10.mirror(Plane.ZY.offset(-20.955)), mode=Mode.SUBTRACT)

    # Chamfer4 of Mirror3
    chamfer4_of_mirror3_edges = [part.edges().sort_by_distance(p)[0] for p in [
        (41.656, 22.098, -8.636),
        (41.656, 22.098, -3.048),
    ]]
    chamfer(chamfer4_of_mirror3_edges, length=CHAMFER4_OF_MIRROR3_SIZE - 0.0001)  # a hair under: the kernel refuses the full size


solid = part.part
